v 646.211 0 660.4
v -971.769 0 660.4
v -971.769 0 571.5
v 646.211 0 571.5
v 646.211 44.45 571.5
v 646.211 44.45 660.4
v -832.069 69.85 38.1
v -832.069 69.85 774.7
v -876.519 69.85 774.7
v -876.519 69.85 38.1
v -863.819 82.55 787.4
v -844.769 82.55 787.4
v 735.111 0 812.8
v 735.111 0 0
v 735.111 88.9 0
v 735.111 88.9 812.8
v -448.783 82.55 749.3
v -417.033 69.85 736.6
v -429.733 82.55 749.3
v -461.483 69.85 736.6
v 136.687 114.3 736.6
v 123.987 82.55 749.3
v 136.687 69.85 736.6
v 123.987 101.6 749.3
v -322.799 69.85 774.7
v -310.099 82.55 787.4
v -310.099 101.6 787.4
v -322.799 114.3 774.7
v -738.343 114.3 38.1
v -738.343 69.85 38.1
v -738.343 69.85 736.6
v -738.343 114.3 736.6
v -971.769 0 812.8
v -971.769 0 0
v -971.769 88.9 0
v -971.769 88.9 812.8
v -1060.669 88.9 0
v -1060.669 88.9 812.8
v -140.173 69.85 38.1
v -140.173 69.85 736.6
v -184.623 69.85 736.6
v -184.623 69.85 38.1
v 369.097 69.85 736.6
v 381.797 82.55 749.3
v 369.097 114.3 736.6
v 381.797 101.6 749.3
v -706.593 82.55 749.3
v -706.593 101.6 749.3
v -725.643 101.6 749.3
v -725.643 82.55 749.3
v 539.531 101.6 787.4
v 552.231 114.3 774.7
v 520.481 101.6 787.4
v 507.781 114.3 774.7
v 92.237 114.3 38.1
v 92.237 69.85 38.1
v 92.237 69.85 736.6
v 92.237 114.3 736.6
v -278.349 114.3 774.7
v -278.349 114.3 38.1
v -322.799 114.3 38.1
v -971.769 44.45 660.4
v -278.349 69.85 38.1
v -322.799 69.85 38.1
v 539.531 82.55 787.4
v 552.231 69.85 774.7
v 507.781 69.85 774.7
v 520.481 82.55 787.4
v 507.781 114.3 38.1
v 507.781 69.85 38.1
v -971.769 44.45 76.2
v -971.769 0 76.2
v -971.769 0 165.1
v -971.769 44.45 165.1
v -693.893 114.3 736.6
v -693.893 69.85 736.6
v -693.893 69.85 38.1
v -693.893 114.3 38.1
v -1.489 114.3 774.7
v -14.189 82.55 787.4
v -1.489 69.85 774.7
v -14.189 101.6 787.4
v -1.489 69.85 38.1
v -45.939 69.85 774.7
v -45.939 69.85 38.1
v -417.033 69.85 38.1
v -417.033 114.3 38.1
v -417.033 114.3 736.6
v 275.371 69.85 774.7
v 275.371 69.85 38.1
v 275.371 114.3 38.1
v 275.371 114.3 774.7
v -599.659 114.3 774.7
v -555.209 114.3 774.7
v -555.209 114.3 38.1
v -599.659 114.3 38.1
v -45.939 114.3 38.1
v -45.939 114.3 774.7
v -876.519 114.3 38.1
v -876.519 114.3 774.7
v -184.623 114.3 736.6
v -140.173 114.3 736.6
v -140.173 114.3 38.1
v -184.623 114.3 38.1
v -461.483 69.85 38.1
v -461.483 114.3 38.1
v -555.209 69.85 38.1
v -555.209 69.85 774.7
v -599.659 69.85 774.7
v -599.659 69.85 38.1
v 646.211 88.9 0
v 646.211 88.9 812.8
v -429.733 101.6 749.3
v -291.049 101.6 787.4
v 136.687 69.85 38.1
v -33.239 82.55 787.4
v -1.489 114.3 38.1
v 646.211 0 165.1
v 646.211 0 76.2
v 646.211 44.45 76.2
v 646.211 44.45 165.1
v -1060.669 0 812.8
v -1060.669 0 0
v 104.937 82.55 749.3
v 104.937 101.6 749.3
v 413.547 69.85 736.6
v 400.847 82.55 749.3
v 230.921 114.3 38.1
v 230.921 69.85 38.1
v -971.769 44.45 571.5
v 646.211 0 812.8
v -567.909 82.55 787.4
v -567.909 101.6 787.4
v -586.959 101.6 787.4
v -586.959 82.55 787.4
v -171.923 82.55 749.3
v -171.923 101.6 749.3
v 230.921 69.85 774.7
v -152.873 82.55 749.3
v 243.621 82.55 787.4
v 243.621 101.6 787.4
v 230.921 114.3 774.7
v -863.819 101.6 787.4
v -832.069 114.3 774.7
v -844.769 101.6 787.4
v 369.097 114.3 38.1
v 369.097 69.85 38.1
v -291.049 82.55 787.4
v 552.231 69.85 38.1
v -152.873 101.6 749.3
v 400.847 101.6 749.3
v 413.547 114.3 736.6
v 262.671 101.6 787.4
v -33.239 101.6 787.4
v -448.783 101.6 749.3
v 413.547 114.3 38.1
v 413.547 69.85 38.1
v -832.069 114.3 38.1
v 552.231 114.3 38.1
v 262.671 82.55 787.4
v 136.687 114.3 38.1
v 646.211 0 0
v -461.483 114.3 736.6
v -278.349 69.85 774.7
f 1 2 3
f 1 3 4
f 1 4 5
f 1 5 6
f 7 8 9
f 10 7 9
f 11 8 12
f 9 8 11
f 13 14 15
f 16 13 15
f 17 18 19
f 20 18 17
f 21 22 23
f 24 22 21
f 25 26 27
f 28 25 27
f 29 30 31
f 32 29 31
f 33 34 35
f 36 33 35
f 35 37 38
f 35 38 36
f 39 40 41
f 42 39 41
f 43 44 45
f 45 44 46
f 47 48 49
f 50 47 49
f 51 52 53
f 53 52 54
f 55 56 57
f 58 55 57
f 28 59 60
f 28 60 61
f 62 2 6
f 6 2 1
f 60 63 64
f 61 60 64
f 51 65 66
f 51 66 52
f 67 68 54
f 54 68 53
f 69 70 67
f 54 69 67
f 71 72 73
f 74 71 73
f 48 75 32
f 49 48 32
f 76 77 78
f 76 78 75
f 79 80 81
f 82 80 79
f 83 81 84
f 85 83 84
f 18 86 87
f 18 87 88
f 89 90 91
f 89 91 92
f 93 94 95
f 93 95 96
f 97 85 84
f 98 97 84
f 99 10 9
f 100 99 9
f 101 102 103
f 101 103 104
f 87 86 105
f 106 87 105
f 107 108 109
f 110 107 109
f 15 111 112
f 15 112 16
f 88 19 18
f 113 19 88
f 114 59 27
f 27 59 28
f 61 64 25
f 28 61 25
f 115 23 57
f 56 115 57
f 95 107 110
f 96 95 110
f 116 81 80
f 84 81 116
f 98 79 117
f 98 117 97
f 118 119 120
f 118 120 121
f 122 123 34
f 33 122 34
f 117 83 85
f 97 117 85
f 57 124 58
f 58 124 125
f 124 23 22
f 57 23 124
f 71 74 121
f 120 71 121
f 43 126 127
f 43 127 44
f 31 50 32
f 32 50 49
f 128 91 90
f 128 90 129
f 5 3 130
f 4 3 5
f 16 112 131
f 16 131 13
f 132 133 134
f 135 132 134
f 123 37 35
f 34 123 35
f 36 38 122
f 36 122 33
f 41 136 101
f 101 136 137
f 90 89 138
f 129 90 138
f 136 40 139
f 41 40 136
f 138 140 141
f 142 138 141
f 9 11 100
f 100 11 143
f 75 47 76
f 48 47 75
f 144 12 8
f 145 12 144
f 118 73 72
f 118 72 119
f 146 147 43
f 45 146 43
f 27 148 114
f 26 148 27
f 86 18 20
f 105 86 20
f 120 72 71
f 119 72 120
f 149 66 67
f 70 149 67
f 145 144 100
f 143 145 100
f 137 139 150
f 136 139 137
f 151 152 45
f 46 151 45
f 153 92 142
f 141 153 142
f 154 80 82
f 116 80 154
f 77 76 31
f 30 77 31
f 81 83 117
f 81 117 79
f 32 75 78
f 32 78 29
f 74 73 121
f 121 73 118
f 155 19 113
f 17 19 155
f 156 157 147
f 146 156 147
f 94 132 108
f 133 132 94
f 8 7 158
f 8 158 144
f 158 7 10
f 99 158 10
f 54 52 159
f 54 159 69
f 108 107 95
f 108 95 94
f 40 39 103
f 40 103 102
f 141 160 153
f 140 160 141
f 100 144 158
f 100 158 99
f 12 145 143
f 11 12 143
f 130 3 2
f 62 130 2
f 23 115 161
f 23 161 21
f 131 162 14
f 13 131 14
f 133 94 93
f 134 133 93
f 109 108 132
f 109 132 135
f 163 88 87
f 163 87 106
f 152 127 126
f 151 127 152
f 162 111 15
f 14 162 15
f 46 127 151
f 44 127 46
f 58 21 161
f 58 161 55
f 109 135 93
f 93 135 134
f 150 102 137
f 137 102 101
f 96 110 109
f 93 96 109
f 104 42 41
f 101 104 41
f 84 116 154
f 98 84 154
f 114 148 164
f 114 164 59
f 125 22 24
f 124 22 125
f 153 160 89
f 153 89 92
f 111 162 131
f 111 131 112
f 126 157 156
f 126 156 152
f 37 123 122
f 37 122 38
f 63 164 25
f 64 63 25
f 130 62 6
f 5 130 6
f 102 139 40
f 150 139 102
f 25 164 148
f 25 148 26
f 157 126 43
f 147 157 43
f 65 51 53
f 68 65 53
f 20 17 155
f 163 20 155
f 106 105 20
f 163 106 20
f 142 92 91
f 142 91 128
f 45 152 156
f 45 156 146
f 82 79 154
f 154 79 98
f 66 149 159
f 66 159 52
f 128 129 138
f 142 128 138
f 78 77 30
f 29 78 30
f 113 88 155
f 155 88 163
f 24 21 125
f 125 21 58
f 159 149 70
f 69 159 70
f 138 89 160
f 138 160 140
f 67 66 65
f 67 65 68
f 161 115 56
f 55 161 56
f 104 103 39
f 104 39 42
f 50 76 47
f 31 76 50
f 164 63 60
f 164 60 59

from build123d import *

# Parameters (mm, degrees)
F0_W        = 88.9
F0_H        = 88.9
F1_DEPTH    = 812.8
F4_W        = 1617.98
F4_H        = 88.9
F5_DEPTH    = 44.45
F8_W        = 44.45
F8_H        = 749.3
F9_DEPTH    = 44.45
F10_W       = 44.45
F10_H       = 711.2
F11_DEPTH   = 44.45
F12_SIZE    = 12.7
F12_2_SIZE  = 12.7
F12_3_SIZE  = 12.7
F12_4_SIZE  = 12.7
F12_5_SIZE  = 12.7
F12_6_SIZE  = 12.7
F12_7_SIZE  = 12.7
F12_8_SIZE  = 12.7
F12_9_SIZE  = 12.7
F12_10_SIZE = 12.7
F12_11_SIZE = 12.7


with BuildPart() as f1:
    # F0 (on Top) → F1 (new body)
    with BuildSketch(Plane.XY):
        with Locations((-1016.219060569, 44.45)):
            Rectangle(F0_W, F0_H)
    extrude(amount=F1_DEPTH)


with BuildPart() as f1b:
    # F0 (on Top) → F1, piece 2 (new body)
    with BuildSketch(Plane.XY):
        with Locations((690.660939431, 44.45)):
            Rectangle(F0_W, F0_H)
    extrude(amount=F1_DEPTH)


with BuildPart() as f5:
    # F4 (on offset) → F5 (new body)
    with BuildSketch(Plane.XZ):
        with Locations((-162.779060569, 615.95)):
            Rectangle(F4_W, F4_H)
    extrude(amount=-F5_DEPTH)


with BuildPart() as f5b:
    # F4 (on offset) → F5, piece 2 (new body)
    with BuildSketch(Plane.XZ):
        with Locations((-162.779060569, 120.65)):
            Rectangle(F4_W, F4_H)
    extrude(amount=-F5_DEPTH)


with BuildPart() as f9:
    # F8 (on offset) → F9 (new body)
    with BuildSketch(Plane(origin=(0, 69.85, 0), x_dir=(-1, 0, 0), z_dir=(0, 1, 0))):
        with Locations((-530.005939431, 412.75)):
            Rectangle(F8_W, F8_H)
    extrude(amount=F9_DEPTH)

    # F12
    f12_edges = [f9.edges().sort_by_distance(p)[0] for p in [
        (507.780939, 92.075, 787.4),
        (552.230939, 92.075, 787.4),
        (530.005939, 69.85, 787.4),
        (530.005939, 114.3, 787.4),
    ]]
    chamfer(f12_edges, length=F12_SIZE)


with BuildPart() as f9b:
    # F8 (on offset) → F9, piece 2 (new body)
    with BuildSketch(Plane(origin=(0, 69.85, 0), x_dir=(-1, 0, 0), z_dir=(0, 1, 0))):
        with Locations((-253.145939431, 412.75)):
            Rectangle(F8_W, F8_H)
    extrude(amount=F9_DEPTH)

    # F12#3
    f12_3_edges = [f9b.edges().sort_by_distance(p)[0] for p in [
        (230.920939, 92.075, 787.4),
        (275.370939, 92.075, 787.4),
        (253.145939, 69.85, 787.4),
        (253.145939, 114.3, 787.4),
    ]]
    chamfer(f12_3_edges, length=F12_3_SIZE)


with BuildPart() as f9c:
    # F8 (on offset) → F9, piece 3 (new body)
    with BuildSketch(Plane(origin=(0, 69.85, 0), x_dir=(-1, 0, 0), z_dir=(0, 1, 0))):
        with Locations((23.714060569, 412.75)):
            Rectangle(F8_W, F8_H)
    extrude(amount=F9_DEPTH)

    # F12#5
    f12_5_edges = [f9c.edges().sort_by_distance(p)[0] for p in [
        (-45.939061, 92.075, 787.4),
        (-1.489061, 92.075, 787.4),
        (-23.714061, 69.85, 787.4),
        (-23.714061, 114.3, 787.4),
    ]]
    chamfer(f12_5_edges, length=F12_5_SIZE)


with BuildPart() as f9d:
    # F8 (on offset) → F9, piece 4 (new body)
    with BuildSketch(Plane(origin=(0, 69.85, 0), x_dir=(-1, 0, 0), z_dir=(0, 1, 0))):
        with Locations((300.574060569, 412.75)):
            Rectangle(F8_W, F8_H)
    extrude(amount=F9_DEPTH)

    # F12#7
    f12_7_edges = [f9d.edges().sort_by_distance(p)[0] for p in [
        (-322.799061, 92.075, 787.4),
        (-278.349061, 92.075, 787.4),
        (-300.574061, 69.85, 787.4),
        (-300.574061, 114.3, 787.4),
    ]]
    chamfer(f12_7_edges, length=F12_7_SIZE)


with BuildPart() as f9e:
    # F8 (on offset) → F9, piece 5 (new body)
    with BuildSketch(Plane(origin=(0, 69.85, 0), x_dir=(-1, 0, 0), z_dir=(0, 1, 0))):
        with Locations((577.434060569, 412.75)):
            Rectangle(F8_W, F8_H)
    extrude(amount=F9_DEPTH)

    # F12#9
    f12_9_edges = [f9e.edges().sort_by_distance(p)[0] for p in [
        (-599.659061, 92.075, 787.4),
        (-555.209061, 92.075, 787.4),
        (-577.434061, 69.85, 787.4),
        (-577.434061, 114.3, 787.4),
    ]]
    chamfer(f12_9_edges, length=F12_9_SIZE)


with BuildPart() as f9f:
    # F8 (on offset) → F9, piece 6 (new body)
    with BuildSketch(Plane(origin=(0, 69.85, 0), x_dir=(-1, 0, 0), z_dir=(0, 1, 0))):
        with Locations((854.294060569, 412.75)):
            Rectangle(F8_W, F8_H)
    extrude(amount=F9_DEPTH)

    # F12#11
    f12_11_edges = [f9f.edges().sort_by_distance(p)[0] for p in [
        (-876.519061, 92.075, 787.4),
        (-832.069061, 92.075, 787.4),
        (-854.294061, 69.85, 787.4),
        (-854.294061, 114.3, 787.4),
    ]]
    chamfer(f12_11_edges, length=F12_11_SIZE)


with BuildPart() as f11:
    # F10 (on offset) → F11 (new body)
    with BuildSketch(Plane(origin=(0, 69.85, 0), x_dir=(-1, 0, 0), z_dir=(0, 1, 0))):
        with Locations((-391.321939431, 393.7)):
            Rectangle(F10_W, F10_H)
    extrude(amount=F11_DEPTH)

    # F12#2
    f12_2_edges = [f11.edges().sort_by_distance(p)[0] for p in [
        (369.096939, 92.075, 749.3),
        (413.546939, 92.075, 749.3),
        (391.321939, 69.85, 749.3),
        (391.321939, 114.3, 749.3),
    ]]
    chamfer(f12_2_edges, length=F12_2_SIZE)


with BuildPart() as f11b:
    # F10 (on offset) → F11, piece 2 (new body)
    with BuildSketch(Plane(origin=(0, 69.85, 0), x_dir=(-1, 0, 0), z_dir=(0, 1, 0))):
        with Locations((-114.461939431, 393.7)):
            Rectangle(F10_W, F10_H)
    extrude(amount=F11_DEPTH)

    # F12#4
    f12_4_edges = [f11b.edges().sort_by_distance(p)[0] for p in [
        (92.236939, 92.075, 749.3),
        (136.686939, 92.075, 749.3),
        (114.461939, 69.85, 749.3),
        (114.461939, 114.3, 749.3),
    ]]
    chamfer(f12_4_edges, length=F12_4_SIZE)


with BuildPart() as f11c:
    # F10 (on offset) → F11, piece 3 (new body)
    with BuildSketch(Plane(origin=(0, 69.85, 0), x_dir=(-1, 0, 0), z_dir=(0, 1, 0))):
        with Locations((162.398060569, 393.7)):
            Rectangle(F10_W, F10_H)
    extrude(amount=F11_DEPTH)

    # F12#6
    f12_6_edges = [f11c.edges().sort_by_distance(p)[0] for p in [
        (-184.623061, 92.075, 749.3),
        (-140.173061, 92.075, 749.3),
        (-162.398061, 69.85, 749.3),
        (-162.398061, 114.3, 749.3),
    ]]
    chamfer(f12_6_edges, length=F12_6_SIZE)


with BuildPart() as f11d:
    # F10 (on offset) → F11, piece 4 (new body)
    with BuildSketch(Plane(origin=(0, 69.85, 0), x_dir=(-1, 0, 0), z_dir=(0, 1, 0))):
        with Locations((439.258060569, 393.7)):
            Rectangle(F10_W, F10_H)
    extrude(amount=F11_DEPTH)

    # F12#8
    f12_8_edges = [f11d.edges().sort_by_distance(p)[0] for p in [
        (-461.483061, 92.075, 749.3),
        (-417.033061, 92.075, 749.3),
        (-439.258061, 69.85, 749.3),
        (-439.258061, 114.3, 749.3),
    ]]
    chamfer(f12_8_edges, length=F12_8_SIZE)


with BuildPart() as f11e:
    # F10 (on offset) → F11, piece 5 (new body)
    with BuildSketch(Plane(origin=(0, 69.85, 0), x_dir=(-1, 0, 0), z_dir=(0, 1, 0))):
        with Locations((716.118060569, 393.7)):
            Rectangle(F10_W, F10_H)
    extrude(amount=F11_DEPTH)

    # F12#10
    f12_10_edges = [f11e.edges().sort_by_distance(p)[0] for p in [
        (-738.343061, 92.075, 749.3),
        (-693.893061, 92.075, 749.3),
        (-716.118061, 69.85, 749.3),
        (-716.118061, 114.3, 749.3),
    ]]
    chamfer(f12_10_edges, length=F12_10_SIZE)


solid = Compound([f1.part, f1b.part, f5.part, f5b.part, f9.part, f9b.part, f9c.part, f9d.part, f9e.part, f9f.part, f11.part, f11b.part, f11c.part, f11d.part, f11e.part])
